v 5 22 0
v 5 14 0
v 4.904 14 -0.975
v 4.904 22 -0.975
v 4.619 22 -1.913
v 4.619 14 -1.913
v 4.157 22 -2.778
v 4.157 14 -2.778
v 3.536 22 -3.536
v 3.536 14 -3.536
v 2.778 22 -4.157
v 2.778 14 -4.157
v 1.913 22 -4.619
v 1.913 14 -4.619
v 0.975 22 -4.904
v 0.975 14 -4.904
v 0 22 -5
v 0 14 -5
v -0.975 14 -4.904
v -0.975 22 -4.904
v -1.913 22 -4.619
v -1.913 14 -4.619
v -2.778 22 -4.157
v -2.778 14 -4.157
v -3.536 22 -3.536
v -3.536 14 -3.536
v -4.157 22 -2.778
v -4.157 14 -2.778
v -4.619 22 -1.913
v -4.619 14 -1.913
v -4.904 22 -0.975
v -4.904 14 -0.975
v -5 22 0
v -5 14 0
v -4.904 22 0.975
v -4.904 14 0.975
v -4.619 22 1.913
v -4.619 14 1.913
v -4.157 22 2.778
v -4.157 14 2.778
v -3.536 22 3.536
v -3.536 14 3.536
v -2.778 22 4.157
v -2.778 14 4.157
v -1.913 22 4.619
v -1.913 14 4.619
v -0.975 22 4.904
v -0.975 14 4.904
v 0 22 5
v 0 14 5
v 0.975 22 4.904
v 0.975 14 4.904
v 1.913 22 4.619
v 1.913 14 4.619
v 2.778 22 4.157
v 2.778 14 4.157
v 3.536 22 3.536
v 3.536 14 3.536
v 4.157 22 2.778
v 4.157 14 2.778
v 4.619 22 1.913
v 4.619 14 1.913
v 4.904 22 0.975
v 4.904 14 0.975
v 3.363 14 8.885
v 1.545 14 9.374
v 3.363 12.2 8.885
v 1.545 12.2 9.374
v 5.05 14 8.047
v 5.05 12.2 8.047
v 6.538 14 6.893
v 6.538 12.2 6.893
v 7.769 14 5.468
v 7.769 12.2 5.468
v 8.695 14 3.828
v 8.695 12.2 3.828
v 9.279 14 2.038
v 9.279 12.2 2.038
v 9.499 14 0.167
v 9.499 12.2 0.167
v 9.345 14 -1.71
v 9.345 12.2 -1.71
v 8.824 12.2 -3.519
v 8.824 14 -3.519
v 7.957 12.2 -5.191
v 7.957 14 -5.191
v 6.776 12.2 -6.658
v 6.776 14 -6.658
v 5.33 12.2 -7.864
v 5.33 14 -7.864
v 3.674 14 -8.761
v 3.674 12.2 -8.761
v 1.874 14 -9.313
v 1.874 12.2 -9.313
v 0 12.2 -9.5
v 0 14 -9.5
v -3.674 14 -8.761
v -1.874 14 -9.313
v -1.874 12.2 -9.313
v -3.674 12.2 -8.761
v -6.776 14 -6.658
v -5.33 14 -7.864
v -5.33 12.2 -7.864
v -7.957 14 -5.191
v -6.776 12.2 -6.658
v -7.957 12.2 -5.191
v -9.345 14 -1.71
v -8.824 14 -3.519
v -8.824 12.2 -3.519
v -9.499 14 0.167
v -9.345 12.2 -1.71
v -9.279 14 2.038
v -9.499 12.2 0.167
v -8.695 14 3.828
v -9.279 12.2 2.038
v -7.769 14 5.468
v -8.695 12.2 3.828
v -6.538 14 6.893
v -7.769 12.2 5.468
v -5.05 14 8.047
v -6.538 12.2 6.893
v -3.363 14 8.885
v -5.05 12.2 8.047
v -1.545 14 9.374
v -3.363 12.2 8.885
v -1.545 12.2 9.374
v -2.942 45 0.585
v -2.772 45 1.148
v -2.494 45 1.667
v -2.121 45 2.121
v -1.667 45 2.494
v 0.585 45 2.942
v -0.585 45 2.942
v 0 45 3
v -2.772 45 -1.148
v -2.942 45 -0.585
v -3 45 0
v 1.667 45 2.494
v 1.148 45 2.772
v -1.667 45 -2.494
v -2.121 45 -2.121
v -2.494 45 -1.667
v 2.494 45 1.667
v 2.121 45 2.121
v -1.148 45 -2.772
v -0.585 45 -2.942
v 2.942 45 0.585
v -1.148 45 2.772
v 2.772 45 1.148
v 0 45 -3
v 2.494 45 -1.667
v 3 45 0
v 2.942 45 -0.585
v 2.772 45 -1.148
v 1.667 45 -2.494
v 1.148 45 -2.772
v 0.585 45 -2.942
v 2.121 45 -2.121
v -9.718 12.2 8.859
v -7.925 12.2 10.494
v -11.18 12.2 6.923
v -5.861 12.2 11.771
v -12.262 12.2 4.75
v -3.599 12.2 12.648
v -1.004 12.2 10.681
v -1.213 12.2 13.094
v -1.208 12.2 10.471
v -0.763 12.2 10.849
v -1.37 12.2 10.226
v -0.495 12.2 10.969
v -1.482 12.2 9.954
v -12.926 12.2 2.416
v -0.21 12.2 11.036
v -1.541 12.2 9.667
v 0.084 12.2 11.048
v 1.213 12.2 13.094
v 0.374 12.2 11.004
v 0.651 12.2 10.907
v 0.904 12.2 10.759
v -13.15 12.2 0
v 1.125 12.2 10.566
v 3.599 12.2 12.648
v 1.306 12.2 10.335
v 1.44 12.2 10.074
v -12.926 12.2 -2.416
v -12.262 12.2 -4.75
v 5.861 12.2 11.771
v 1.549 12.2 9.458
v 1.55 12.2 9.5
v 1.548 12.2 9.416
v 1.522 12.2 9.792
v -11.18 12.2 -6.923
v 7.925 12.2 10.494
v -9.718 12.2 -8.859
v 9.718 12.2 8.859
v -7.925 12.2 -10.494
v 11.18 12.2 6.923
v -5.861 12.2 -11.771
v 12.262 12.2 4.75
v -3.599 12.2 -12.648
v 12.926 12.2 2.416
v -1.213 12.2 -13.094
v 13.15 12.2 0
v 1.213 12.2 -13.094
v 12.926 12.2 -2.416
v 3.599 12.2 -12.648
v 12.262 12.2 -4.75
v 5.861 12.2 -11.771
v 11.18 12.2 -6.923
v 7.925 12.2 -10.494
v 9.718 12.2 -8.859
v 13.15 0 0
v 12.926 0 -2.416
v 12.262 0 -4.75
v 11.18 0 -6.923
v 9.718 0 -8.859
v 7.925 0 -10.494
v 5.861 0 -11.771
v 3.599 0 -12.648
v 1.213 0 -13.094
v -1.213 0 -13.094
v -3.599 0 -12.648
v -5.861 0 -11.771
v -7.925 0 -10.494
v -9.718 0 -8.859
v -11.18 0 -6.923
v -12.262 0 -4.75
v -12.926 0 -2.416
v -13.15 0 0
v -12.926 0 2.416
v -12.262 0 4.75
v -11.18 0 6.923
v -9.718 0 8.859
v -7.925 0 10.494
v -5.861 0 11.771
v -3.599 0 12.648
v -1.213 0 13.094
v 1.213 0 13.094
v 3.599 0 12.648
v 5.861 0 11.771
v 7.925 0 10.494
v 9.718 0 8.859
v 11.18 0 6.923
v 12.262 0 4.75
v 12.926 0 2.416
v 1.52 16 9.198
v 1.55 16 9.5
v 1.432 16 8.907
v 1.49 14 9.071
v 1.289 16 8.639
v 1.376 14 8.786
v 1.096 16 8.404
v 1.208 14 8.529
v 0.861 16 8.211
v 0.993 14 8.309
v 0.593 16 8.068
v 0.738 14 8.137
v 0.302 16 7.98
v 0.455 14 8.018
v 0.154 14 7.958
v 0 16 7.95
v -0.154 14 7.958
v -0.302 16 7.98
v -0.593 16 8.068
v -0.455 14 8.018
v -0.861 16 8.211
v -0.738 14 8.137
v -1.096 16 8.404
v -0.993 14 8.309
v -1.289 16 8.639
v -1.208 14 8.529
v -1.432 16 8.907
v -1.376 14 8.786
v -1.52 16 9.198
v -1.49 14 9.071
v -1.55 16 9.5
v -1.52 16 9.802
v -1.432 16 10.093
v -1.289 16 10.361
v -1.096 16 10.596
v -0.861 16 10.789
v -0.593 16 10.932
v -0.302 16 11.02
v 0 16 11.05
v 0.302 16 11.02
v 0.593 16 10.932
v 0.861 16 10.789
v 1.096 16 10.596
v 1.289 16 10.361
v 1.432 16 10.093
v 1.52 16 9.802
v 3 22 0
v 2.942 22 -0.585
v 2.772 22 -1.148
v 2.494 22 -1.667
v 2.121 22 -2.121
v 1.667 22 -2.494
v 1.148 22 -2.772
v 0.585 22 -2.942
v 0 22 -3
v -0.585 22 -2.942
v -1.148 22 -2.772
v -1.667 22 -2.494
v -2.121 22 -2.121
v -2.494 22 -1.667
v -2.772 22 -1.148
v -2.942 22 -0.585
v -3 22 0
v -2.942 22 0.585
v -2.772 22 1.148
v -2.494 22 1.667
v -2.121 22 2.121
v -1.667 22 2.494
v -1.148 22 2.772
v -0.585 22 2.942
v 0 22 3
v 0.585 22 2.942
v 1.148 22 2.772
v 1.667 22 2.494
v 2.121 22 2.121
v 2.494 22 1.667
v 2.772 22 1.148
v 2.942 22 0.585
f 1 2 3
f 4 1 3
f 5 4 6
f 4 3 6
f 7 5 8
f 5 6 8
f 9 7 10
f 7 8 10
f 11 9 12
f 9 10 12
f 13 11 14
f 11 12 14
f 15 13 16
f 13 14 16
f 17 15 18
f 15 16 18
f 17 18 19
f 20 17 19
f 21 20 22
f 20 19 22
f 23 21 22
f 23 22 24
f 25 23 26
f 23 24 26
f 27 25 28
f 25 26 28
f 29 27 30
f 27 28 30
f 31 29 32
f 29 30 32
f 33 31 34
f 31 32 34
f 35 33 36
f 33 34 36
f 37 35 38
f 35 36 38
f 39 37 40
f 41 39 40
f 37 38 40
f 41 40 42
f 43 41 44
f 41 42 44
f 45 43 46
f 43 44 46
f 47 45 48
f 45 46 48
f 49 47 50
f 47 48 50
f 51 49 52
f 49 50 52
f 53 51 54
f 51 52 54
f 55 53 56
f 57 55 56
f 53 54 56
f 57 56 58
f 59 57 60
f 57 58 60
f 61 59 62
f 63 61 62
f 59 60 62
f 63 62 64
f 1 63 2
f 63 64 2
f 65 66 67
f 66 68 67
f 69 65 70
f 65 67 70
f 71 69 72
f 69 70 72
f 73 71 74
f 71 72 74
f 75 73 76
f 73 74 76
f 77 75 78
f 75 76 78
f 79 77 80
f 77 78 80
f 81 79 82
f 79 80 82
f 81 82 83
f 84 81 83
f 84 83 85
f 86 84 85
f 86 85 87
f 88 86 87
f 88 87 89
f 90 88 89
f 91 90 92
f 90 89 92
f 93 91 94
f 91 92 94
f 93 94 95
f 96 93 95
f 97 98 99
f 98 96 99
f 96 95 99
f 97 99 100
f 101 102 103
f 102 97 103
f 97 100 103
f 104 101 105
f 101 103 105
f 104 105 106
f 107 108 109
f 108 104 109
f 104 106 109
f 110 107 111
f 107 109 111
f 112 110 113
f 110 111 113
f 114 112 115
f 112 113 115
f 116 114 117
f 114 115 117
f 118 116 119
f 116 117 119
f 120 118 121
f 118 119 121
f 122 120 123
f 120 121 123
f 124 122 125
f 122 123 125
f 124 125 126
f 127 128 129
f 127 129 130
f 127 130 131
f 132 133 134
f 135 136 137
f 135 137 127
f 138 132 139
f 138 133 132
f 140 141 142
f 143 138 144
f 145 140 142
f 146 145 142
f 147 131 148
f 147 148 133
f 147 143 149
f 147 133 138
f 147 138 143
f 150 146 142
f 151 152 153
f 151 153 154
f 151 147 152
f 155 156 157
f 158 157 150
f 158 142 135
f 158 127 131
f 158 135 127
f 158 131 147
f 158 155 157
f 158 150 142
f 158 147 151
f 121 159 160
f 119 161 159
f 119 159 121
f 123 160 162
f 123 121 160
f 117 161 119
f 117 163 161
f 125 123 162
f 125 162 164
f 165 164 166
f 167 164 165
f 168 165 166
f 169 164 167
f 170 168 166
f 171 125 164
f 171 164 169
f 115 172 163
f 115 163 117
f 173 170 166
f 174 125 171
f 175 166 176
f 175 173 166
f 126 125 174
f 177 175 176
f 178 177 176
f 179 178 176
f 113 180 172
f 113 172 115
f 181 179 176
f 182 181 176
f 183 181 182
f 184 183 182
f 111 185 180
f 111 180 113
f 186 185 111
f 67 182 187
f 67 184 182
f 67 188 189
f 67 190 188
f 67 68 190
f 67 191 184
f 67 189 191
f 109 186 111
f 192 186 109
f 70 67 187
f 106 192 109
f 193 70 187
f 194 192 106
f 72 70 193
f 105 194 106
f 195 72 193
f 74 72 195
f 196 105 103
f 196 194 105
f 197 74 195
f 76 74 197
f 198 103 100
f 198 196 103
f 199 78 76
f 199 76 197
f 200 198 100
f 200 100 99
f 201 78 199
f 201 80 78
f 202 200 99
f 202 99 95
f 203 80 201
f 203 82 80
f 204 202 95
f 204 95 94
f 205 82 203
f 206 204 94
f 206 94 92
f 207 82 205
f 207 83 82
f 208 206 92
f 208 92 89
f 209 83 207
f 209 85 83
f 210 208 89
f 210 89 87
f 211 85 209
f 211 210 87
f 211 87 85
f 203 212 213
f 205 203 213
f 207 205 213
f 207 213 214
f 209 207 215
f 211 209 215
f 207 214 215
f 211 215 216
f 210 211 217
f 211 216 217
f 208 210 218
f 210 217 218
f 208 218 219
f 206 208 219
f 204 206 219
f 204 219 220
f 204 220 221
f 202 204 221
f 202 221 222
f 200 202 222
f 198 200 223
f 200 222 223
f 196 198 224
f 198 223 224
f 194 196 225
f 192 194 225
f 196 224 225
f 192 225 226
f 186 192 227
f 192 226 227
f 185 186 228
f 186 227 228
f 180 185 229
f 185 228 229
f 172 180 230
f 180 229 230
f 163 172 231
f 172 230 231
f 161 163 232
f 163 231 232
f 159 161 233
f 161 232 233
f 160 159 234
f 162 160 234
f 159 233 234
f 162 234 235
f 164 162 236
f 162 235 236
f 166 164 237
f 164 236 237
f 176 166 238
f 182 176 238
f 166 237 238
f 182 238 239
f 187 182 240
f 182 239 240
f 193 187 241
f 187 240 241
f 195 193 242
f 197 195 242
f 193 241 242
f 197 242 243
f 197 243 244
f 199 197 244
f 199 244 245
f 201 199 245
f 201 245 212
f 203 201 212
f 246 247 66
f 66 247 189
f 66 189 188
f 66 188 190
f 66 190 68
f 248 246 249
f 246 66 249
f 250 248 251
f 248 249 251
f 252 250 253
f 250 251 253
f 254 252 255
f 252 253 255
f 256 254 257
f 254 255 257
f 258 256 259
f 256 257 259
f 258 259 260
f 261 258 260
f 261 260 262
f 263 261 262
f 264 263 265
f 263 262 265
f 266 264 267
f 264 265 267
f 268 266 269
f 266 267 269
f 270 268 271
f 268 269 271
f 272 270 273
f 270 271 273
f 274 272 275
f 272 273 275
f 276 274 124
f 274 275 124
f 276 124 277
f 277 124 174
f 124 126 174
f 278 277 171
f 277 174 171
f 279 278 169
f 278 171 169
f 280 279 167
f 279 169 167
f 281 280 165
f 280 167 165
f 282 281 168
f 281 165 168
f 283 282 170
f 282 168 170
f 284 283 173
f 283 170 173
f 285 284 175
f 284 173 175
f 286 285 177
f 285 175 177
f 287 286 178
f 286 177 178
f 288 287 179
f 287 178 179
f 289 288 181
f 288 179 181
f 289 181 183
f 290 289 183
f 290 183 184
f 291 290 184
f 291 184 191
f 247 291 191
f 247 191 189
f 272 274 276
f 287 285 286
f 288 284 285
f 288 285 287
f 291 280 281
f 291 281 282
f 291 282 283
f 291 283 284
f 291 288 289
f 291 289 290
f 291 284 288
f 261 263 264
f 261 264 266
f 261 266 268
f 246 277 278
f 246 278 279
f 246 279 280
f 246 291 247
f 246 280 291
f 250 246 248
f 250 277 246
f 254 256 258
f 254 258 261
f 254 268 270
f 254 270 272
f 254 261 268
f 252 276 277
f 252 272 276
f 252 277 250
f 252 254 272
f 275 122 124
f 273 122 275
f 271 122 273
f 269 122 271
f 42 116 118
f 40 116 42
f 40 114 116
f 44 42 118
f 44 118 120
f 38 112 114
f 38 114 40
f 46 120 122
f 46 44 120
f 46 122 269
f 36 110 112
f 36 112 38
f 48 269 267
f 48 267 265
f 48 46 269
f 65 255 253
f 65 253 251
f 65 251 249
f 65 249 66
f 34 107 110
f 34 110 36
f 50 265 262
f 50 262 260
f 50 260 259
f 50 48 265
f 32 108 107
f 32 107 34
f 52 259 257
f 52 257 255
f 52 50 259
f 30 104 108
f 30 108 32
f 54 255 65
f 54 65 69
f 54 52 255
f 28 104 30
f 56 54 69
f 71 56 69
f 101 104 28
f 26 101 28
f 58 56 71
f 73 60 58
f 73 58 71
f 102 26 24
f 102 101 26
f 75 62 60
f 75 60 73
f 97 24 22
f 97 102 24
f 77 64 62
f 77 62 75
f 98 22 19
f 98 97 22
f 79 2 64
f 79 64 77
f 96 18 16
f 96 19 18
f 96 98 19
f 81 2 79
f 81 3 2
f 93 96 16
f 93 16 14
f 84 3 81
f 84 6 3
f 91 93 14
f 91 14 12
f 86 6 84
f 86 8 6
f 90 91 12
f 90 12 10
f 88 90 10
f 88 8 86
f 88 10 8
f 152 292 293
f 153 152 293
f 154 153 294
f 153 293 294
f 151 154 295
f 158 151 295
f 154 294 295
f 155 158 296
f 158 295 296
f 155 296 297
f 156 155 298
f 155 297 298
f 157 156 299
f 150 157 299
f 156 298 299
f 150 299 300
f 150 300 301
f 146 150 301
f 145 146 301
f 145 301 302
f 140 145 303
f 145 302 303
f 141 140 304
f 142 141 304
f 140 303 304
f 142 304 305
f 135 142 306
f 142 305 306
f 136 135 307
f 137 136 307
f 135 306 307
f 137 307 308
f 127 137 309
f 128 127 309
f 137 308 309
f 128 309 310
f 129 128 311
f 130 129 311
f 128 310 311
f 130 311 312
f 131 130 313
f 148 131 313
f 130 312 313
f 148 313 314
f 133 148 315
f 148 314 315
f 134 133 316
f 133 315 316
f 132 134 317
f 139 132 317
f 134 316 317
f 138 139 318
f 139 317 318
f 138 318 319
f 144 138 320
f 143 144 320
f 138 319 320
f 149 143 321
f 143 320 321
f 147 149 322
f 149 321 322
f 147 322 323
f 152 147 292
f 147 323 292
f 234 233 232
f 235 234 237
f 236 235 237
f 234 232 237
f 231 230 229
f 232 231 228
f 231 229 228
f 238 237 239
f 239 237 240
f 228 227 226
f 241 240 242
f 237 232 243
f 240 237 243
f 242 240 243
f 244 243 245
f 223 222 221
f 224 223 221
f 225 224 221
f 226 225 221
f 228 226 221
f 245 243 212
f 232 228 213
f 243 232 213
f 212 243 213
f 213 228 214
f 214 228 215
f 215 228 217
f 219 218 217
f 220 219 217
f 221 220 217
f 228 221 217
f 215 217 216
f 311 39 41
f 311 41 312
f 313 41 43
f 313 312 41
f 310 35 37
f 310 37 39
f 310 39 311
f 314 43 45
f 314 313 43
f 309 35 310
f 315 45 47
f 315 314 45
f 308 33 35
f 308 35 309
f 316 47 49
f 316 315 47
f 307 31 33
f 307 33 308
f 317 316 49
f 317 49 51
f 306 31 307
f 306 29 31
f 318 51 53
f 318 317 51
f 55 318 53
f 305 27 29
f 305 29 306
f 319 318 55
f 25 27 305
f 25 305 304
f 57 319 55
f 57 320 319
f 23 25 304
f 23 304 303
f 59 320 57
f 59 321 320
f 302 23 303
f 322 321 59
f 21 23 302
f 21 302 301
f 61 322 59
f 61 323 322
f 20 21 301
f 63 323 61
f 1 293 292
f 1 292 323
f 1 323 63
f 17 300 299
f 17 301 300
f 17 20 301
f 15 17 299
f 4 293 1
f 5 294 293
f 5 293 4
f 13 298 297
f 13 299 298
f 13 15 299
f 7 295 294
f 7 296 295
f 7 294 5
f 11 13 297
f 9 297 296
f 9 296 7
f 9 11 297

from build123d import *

# Parameters (mm, degrees)
SKETCH1_R           = 13.15
BOSS_EXTRUDE1_DEPTH = 12.2
SKETCH2_R           = 9.5
BOSS_EXTRUDE2_DEPTH = 1.8
SKETCH3_R           = 5
BOSS_EXTRUDE3_DEPTH = 8
SKETCH4_R           = 3
BOSS_EXTRUDE4_DEPTH = 23
SKETCH5_R           = 1.55
BOSS_EXTRUDE5_DEPTH = 3.8


with BuildPart() as part:
    # Sketch1 → Boss-Extrude1 (new body)
    with BuildSketch(Plane(origin=(0, 0, 0), x_dir=(1, 0, 0), z_dir=(0, 1, 0))):
        Circle(SKETCH1_R)
    extrude(amount=BOSS_EXTRUDE1_DEPTH)

    # Sketch2 → Boss-Extrude2 (add)
    with BuildSketch(Plane(origin=(0, 12.2, 0), x_dir=(1, 0, 0), z_dir=(0, 1, 0))):
        Circle(SKETCH2_R)
    extrude(amount=BOSS_EXTRUDE2_DEPTH)

    # Sketch3 → Boss-Extrude3 (add)
    with BuildSketch(Plane(origin=(0, 14, 0), x_dir=(1, 0, 0), z_dir=(0, 1, 0))):
        Circle(SKETCH3_R)
    extrude(amount=BOSS_EXTRUDE3_DEPTH)

    # Sketch4 → Boss-Extrude4 (add)
    with BuildSketch(Plane(origin=(0, 22, 0), x_dir=(1, 0, 0), z_dir=(0, 1, 0))):
        Circle(SKETCH4_R)
    extrude(amount=BOSS_EXTRUDE4_DEPTH)

    # Sketch5 → Boss-Extrude5 (add)
    with BuildSketch(Plane(origin=(0, 12.2, 0), x_dir=(1, 0, 0), z_dir=(0, 1, 0))):
        with Locations((0, -9.5)):
            Circle(SKETCH5_R)
    extrude(amount=BOSS_EXTRUDE5_DEPTH)


solid = part.part
